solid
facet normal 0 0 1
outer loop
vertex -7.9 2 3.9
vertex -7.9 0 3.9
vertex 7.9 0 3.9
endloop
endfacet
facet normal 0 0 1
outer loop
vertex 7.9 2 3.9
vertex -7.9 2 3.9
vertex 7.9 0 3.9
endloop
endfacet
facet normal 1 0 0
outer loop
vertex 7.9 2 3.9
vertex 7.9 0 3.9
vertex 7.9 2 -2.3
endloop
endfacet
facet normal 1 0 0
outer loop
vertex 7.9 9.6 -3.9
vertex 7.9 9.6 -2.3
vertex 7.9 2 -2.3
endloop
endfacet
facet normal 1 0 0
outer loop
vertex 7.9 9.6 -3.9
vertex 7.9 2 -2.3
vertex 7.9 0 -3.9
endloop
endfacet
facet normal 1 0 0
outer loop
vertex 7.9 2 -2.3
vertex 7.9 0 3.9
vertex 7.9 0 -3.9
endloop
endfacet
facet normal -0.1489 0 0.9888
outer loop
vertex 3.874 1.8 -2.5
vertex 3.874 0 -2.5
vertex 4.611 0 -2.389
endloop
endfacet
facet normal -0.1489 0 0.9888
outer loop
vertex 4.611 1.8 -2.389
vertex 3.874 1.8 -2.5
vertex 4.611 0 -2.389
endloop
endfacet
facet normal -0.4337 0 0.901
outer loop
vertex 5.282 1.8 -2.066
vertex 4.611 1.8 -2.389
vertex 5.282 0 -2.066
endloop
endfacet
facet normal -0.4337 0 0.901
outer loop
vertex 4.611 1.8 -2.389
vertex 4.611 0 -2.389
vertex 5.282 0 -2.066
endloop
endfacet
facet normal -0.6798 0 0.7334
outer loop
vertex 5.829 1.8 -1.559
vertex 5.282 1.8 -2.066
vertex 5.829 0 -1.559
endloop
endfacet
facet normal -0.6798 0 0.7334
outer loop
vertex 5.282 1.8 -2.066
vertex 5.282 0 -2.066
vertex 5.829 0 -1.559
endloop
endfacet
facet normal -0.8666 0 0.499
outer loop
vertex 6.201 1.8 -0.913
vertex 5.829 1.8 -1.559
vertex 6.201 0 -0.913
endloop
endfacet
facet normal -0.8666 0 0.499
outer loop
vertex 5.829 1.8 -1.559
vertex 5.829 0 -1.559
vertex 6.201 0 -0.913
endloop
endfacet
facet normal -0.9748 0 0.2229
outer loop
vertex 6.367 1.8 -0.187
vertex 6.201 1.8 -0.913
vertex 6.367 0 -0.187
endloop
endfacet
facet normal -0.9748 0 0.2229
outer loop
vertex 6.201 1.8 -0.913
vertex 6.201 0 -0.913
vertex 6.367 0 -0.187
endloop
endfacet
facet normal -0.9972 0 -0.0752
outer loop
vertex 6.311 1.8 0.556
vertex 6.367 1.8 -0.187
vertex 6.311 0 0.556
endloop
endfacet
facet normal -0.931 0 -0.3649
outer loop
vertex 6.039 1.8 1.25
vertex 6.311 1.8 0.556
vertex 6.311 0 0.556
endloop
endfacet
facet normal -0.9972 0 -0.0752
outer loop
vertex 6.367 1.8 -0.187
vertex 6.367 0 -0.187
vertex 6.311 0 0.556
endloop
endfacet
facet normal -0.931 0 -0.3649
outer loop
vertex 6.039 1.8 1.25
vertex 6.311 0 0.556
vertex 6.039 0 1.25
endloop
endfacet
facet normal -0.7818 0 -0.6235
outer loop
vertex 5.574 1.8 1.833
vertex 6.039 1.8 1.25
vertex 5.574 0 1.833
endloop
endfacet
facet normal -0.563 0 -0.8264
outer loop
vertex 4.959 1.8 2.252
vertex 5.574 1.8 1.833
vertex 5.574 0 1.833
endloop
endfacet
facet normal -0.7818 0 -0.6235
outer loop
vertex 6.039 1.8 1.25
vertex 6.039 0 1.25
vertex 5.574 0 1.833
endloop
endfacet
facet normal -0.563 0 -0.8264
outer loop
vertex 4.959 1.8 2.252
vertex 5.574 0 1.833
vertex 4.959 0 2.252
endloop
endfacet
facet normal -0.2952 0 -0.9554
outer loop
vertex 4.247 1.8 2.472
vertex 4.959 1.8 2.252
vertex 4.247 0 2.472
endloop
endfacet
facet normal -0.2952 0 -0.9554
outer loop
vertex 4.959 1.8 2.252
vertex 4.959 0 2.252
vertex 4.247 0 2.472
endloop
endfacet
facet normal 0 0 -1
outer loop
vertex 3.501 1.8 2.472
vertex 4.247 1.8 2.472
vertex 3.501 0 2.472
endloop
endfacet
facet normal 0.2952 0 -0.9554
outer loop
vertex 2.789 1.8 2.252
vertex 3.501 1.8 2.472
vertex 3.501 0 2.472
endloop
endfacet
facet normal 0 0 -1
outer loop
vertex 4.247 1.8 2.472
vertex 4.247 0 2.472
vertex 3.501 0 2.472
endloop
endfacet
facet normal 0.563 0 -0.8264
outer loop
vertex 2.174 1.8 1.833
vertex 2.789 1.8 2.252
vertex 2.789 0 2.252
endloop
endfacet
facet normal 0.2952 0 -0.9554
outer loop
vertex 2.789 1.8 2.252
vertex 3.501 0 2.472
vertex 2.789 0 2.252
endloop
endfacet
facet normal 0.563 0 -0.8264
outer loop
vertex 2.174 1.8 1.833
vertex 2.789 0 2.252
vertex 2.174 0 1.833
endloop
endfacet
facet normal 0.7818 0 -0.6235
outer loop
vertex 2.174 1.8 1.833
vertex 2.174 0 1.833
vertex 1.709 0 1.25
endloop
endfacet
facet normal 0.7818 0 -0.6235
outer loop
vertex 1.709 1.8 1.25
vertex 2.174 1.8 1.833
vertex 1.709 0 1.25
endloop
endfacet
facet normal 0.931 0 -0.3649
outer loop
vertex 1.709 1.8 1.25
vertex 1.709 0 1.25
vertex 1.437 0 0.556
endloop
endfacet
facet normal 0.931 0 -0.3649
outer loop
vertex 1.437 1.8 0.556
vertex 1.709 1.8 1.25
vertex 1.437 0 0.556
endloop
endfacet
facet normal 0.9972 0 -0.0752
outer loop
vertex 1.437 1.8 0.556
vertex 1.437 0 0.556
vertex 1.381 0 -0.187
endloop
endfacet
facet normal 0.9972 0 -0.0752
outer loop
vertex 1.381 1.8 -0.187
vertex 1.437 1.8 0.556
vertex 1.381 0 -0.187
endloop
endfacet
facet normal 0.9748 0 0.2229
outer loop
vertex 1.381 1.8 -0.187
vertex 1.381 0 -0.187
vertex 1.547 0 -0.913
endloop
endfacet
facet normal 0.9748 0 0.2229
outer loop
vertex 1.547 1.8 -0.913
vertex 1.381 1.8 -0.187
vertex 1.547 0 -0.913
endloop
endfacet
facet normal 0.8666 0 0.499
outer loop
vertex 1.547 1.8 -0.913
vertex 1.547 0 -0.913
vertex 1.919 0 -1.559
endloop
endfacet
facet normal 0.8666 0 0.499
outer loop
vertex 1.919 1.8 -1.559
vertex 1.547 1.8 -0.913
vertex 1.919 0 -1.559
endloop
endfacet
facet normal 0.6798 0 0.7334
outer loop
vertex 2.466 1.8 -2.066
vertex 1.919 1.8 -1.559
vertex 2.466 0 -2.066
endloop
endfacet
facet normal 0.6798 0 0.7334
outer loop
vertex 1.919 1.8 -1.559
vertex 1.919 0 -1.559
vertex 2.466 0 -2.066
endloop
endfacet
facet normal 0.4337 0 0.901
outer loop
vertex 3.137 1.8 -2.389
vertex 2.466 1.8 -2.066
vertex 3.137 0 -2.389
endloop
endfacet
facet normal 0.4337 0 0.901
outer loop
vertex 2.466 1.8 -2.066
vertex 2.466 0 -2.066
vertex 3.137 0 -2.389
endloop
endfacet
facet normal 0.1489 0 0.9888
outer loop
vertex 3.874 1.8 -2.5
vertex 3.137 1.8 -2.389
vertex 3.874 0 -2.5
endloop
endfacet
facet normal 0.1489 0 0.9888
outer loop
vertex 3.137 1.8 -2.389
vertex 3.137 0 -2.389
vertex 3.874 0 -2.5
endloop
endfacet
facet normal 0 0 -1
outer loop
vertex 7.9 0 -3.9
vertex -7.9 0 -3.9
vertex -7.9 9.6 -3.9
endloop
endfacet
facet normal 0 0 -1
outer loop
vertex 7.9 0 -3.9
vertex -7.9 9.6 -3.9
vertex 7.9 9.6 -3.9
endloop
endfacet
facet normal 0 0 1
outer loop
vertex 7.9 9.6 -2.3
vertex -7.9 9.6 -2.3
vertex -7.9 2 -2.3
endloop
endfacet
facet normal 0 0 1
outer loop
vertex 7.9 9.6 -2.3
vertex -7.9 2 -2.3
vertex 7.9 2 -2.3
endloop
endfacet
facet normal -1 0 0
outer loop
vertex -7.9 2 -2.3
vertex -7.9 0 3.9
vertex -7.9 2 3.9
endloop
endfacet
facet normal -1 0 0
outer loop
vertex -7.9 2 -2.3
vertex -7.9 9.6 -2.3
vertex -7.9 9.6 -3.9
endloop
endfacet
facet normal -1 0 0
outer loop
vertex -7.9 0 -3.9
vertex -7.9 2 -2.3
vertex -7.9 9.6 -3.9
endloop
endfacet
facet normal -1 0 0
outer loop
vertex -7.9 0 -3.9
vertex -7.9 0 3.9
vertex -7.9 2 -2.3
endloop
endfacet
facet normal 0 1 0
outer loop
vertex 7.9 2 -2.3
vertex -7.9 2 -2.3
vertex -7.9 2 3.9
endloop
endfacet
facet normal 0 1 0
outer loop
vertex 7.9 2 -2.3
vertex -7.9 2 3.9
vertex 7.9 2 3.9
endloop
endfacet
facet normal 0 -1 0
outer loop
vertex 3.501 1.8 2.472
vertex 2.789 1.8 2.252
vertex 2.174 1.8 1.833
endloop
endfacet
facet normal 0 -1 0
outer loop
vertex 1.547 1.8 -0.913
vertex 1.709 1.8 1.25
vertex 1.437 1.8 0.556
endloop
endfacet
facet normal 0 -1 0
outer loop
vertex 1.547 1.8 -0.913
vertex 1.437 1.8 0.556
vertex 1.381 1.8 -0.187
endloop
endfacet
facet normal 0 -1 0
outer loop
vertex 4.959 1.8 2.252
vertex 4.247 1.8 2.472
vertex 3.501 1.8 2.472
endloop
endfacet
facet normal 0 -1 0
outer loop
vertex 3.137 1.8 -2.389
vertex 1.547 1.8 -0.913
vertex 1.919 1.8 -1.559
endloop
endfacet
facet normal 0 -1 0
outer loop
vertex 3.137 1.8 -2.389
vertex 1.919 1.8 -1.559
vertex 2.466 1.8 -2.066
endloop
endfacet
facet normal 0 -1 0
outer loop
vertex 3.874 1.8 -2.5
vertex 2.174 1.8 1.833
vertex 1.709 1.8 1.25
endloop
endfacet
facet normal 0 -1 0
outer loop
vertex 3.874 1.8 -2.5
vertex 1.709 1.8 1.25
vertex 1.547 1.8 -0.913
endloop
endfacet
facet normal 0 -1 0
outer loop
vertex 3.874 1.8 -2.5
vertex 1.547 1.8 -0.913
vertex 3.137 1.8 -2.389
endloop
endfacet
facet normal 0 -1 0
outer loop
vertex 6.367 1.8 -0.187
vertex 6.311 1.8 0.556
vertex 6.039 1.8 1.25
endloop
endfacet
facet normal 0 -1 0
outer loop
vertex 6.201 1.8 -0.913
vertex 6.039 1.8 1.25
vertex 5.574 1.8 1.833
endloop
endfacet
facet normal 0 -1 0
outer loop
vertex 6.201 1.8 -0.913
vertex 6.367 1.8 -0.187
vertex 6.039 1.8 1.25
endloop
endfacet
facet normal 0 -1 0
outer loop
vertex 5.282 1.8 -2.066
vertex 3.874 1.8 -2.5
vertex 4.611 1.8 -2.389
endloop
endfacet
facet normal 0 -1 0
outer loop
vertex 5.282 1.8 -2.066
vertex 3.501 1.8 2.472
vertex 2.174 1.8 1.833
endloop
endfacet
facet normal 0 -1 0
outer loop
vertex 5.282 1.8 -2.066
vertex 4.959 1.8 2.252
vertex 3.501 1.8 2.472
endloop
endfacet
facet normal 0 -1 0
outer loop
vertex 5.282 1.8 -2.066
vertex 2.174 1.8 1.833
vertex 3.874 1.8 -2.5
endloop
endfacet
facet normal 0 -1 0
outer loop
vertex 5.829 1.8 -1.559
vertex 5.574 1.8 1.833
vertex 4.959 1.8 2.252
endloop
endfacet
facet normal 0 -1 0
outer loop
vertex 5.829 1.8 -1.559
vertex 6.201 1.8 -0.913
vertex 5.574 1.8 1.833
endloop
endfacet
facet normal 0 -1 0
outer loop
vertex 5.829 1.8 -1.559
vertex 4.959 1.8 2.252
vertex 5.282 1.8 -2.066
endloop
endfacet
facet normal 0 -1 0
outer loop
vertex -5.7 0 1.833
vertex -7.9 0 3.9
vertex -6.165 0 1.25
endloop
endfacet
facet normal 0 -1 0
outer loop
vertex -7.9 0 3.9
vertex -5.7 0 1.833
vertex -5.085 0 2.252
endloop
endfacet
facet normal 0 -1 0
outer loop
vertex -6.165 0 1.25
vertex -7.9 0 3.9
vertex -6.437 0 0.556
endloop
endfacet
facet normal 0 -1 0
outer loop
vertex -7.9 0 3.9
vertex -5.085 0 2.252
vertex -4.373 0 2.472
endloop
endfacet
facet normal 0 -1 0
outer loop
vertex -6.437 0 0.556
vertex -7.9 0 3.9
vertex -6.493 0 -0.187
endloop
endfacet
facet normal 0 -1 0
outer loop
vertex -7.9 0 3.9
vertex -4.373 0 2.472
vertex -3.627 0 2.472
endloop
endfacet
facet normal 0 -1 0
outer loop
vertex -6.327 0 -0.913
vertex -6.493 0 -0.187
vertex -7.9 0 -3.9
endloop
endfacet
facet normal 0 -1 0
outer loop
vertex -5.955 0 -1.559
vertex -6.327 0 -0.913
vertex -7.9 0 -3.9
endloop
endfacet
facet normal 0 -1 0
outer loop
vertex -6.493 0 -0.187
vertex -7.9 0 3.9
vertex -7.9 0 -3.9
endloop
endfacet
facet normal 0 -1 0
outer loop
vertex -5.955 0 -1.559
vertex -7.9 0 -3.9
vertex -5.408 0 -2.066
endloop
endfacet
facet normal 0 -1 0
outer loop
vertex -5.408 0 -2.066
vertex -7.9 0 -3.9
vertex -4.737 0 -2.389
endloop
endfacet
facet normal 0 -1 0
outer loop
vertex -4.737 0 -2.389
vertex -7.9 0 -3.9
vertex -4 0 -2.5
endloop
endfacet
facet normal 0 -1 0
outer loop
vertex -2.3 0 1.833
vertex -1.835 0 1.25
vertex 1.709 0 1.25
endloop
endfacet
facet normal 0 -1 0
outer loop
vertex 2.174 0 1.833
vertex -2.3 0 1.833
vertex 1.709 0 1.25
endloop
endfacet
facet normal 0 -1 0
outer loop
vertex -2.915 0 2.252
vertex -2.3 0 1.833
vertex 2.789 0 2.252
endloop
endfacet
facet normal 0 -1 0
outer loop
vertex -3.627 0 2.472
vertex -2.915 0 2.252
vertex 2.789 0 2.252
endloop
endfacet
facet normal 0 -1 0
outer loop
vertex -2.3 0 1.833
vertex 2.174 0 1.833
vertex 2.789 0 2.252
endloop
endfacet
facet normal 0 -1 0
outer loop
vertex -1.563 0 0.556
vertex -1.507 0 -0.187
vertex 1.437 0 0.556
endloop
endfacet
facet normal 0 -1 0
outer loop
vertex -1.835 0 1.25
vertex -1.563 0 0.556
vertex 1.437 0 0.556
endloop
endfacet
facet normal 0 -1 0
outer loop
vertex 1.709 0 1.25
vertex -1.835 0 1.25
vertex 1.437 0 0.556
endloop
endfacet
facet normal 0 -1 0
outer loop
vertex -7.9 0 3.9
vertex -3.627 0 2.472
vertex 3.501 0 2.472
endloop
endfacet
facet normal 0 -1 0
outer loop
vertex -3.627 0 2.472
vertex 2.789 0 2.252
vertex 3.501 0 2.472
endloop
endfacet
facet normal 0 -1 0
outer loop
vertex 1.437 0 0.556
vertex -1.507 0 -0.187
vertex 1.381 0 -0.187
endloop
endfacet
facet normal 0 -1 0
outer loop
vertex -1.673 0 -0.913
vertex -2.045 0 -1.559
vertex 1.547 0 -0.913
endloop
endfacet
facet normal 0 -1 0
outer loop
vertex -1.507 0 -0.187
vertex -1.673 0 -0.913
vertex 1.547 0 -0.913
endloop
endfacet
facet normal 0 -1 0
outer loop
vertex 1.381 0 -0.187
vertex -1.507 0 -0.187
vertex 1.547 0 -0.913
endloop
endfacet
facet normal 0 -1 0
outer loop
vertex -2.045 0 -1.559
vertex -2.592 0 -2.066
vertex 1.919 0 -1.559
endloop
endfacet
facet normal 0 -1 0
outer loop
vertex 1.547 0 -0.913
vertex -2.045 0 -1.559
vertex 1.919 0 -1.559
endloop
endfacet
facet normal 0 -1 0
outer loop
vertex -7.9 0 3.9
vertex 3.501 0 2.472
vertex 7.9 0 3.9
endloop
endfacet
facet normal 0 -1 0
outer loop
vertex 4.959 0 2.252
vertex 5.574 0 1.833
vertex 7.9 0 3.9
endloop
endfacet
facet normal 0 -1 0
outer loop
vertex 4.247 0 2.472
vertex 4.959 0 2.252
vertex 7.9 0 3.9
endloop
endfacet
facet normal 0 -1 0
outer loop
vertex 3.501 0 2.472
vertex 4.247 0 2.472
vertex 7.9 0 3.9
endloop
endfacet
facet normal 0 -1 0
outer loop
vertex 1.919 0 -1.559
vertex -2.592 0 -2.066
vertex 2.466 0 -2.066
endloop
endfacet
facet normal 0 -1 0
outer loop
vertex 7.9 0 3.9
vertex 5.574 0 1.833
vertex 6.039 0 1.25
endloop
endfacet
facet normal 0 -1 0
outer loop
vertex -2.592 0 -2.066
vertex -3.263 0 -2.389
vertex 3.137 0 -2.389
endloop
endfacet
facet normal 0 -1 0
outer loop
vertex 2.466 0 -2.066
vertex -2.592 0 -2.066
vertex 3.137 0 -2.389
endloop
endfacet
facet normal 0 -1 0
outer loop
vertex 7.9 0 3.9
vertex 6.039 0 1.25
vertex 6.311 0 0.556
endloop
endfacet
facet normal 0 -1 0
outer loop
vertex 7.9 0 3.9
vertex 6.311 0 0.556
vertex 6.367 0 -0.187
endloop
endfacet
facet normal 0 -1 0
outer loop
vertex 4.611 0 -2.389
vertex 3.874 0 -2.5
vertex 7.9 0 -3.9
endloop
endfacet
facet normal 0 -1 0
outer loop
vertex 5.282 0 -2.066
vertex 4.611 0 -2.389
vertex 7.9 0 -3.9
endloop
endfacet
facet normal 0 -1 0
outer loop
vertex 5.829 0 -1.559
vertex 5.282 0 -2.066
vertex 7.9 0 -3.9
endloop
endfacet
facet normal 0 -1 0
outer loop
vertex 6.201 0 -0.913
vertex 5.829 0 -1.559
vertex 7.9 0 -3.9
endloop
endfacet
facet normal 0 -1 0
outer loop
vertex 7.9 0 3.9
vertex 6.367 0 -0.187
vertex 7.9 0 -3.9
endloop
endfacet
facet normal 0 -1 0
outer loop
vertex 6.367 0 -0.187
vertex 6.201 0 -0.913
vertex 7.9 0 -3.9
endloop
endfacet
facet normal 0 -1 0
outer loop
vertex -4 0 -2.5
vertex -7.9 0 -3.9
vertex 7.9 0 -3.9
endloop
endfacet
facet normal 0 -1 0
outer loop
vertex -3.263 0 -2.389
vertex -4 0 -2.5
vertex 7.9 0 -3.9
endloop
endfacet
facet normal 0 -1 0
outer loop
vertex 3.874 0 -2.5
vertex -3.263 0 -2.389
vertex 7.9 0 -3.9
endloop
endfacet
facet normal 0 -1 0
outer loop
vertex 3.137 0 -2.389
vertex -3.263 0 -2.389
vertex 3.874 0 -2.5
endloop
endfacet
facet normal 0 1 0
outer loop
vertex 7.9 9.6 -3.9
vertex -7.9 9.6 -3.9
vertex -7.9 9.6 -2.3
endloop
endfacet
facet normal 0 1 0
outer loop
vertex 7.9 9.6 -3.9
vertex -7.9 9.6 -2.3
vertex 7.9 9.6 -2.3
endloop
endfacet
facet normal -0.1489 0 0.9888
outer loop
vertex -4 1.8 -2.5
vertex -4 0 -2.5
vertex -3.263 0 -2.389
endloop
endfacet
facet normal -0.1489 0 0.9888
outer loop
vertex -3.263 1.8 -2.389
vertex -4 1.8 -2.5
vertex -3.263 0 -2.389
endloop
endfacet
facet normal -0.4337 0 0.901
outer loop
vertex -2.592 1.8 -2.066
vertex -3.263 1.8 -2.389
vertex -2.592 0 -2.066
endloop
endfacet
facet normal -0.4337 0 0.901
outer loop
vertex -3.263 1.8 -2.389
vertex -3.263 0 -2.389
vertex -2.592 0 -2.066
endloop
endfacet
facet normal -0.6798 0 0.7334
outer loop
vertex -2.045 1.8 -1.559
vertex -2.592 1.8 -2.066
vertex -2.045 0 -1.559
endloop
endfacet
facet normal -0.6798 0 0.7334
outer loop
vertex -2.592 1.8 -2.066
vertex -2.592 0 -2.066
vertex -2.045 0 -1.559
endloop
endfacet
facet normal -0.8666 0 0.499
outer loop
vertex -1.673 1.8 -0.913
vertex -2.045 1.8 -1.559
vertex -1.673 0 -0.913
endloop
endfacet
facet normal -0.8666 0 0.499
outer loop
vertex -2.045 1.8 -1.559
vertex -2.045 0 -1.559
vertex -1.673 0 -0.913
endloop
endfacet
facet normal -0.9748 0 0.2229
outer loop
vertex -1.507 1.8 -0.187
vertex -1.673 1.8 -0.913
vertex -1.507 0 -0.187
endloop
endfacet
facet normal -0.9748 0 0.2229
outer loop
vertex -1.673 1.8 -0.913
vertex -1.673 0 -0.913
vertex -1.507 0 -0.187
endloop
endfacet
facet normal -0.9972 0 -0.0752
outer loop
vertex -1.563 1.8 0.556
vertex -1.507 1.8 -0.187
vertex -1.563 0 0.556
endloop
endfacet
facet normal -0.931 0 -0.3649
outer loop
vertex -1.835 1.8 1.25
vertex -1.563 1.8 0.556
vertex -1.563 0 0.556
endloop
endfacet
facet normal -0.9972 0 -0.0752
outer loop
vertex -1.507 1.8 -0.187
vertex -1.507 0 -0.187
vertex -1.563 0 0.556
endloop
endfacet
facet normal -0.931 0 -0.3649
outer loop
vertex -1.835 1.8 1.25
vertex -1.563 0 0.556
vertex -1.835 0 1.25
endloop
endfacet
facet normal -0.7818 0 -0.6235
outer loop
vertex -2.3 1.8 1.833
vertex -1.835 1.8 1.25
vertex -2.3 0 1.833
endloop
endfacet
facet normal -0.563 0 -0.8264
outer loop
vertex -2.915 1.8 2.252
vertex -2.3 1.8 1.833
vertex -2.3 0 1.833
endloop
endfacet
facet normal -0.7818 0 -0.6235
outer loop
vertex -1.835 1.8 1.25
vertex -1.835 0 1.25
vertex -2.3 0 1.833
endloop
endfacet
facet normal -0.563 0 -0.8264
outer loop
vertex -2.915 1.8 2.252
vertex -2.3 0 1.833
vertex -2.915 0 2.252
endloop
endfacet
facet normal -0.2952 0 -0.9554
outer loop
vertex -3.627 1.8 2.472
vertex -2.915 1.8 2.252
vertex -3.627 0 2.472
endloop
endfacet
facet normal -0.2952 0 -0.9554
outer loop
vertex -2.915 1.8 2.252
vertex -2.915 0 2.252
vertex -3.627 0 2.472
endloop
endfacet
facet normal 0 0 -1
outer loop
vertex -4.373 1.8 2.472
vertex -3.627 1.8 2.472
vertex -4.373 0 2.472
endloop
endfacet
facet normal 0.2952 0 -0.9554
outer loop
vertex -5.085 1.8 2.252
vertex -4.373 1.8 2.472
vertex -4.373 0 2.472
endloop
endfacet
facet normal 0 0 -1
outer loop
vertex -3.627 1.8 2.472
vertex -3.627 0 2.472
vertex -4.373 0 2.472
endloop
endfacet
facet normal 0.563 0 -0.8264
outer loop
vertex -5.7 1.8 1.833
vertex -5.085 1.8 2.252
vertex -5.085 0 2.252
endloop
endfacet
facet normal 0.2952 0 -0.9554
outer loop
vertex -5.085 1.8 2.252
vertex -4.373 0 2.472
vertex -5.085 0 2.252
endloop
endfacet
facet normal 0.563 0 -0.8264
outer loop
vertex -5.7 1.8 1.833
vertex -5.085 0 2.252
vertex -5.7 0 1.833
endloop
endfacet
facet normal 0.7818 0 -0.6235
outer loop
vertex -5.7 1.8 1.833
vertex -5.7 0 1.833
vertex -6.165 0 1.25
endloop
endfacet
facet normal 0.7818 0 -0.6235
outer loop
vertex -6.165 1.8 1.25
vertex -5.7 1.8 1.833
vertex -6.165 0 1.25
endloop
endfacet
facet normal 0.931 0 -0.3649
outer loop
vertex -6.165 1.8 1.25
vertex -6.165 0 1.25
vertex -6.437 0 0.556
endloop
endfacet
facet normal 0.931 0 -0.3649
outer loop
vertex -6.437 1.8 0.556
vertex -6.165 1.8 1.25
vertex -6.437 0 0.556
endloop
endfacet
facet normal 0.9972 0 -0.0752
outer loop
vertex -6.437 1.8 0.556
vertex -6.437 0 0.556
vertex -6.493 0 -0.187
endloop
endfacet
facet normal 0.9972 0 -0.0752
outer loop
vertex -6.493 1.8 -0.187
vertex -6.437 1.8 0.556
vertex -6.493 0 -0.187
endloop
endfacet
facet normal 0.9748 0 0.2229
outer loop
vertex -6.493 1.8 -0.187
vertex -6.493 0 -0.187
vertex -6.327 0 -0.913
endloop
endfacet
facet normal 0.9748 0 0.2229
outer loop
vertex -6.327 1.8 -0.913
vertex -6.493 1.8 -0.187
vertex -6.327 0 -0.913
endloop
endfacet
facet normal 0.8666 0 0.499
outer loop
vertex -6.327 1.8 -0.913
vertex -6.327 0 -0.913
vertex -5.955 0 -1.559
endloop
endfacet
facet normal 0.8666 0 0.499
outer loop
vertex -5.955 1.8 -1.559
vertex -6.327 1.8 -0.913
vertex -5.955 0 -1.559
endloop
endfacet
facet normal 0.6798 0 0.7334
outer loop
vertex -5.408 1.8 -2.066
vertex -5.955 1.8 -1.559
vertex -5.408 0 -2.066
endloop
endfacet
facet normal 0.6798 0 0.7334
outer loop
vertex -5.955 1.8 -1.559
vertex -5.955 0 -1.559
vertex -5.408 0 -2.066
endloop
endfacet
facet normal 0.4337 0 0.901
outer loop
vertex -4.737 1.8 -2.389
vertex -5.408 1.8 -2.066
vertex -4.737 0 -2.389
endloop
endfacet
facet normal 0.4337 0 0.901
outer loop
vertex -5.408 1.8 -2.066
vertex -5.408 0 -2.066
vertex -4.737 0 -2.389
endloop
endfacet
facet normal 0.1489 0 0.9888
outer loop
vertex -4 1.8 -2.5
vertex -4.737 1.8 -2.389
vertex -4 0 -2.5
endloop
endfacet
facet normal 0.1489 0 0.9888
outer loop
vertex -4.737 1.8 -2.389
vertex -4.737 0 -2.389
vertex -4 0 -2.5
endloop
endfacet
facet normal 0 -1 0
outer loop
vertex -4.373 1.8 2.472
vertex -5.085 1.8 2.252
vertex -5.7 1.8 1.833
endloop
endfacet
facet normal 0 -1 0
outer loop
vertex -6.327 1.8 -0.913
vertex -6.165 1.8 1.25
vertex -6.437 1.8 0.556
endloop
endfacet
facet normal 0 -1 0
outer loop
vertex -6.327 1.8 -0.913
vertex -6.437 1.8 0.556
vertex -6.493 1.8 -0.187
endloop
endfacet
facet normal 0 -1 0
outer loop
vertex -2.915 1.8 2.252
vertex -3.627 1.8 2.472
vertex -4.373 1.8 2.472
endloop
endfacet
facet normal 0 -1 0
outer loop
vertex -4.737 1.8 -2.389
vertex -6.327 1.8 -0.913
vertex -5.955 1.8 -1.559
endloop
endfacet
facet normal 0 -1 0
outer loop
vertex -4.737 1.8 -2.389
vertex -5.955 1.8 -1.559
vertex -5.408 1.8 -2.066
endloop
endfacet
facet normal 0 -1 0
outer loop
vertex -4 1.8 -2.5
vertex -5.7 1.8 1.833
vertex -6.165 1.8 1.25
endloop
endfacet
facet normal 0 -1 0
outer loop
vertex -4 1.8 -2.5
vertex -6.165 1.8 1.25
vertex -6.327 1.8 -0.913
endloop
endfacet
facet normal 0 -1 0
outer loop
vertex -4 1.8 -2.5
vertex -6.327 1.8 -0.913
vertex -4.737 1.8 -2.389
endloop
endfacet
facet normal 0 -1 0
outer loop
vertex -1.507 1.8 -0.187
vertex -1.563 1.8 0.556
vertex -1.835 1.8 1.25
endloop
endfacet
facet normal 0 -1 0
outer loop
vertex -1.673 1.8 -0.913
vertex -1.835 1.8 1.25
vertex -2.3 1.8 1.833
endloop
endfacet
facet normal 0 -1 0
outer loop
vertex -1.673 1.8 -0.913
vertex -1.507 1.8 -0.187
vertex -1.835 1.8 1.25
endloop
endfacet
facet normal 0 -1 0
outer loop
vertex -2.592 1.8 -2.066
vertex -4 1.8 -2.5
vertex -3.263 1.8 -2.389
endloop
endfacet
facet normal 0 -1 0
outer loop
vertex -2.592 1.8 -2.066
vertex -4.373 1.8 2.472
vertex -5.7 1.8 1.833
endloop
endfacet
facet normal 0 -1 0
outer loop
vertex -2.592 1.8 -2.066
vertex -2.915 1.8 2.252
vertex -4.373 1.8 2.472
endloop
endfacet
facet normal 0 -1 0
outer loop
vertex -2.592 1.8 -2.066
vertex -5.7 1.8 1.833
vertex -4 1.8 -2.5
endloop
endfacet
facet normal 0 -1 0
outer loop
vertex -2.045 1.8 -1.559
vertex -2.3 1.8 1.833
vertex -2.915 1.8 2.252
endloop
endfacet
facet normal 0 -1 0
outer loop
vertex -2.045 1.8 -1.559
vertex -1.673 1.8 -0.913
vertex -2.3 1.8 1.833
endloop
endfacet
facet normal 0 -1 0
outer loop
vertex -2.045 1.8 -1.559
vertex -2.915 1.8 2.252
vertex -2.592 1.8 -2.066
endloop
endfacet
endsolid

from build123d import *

# Parameters (mm, degrees)
SKETCH_1_W          = 15.8
SKETCH_1_H          = 7.8
EXTRUDE_1_DEPTH     = 9.6
SKETCH_2_W          = 15.8
SKETCH_2_H          = 6.199999898
CUT_EXTRUDE_1_DEPTH = 7.6
SKETCH_3_R          = 2.5
CUT_EXTRUDE_2_DEPTH = 1.8


with BuildPart() as part:
    # Эскиз1 → Бобышка-Вытянуть1 (new body)
    with BuildSketch(Plane(origin=(0, 0, 0), x_dir=(1, 0, 0), z_dir=(0, 1, 0))):
        Rectangle(SKETCH_1_W, SKETCH_1_H)
    extrude(amount=EXTRUDE_1_DEPTH)

    # Эскиз2 → Вырез-Вытянуть1 (cut)
    with BuildSketch(Plane(origin=(0, 9.6, 0), x_dir=(1, 0, 0), z_dir=(0, 1, 0))):
        with Locations((0, -0.800000051)):
            Rectangle(SKETCH_2_W, SKETCH_2_H)
    extrude(amount=-CUT_EXTRUDE_1_DEPTH, mode=Mode.SUBTRACT)

    # Эскиз3 → Вырез-Вытянуть2 (cut)
    with BuildSketch(Plane.XZ):
        with Locations(Location((-4, -7.4e-08, 0), (0, 0, 270))):
            Circle(SKETCH_3_R)
        with Locations(Location((3.874, -7.4e-08, 0), (0, 0, 270))):
            Circle(SKETCH_3_R)
    extrude(amount=-CUT_EXTRUDE_2_DEPTH, mode=Mode.SUBTRACT)


solid = part.part
